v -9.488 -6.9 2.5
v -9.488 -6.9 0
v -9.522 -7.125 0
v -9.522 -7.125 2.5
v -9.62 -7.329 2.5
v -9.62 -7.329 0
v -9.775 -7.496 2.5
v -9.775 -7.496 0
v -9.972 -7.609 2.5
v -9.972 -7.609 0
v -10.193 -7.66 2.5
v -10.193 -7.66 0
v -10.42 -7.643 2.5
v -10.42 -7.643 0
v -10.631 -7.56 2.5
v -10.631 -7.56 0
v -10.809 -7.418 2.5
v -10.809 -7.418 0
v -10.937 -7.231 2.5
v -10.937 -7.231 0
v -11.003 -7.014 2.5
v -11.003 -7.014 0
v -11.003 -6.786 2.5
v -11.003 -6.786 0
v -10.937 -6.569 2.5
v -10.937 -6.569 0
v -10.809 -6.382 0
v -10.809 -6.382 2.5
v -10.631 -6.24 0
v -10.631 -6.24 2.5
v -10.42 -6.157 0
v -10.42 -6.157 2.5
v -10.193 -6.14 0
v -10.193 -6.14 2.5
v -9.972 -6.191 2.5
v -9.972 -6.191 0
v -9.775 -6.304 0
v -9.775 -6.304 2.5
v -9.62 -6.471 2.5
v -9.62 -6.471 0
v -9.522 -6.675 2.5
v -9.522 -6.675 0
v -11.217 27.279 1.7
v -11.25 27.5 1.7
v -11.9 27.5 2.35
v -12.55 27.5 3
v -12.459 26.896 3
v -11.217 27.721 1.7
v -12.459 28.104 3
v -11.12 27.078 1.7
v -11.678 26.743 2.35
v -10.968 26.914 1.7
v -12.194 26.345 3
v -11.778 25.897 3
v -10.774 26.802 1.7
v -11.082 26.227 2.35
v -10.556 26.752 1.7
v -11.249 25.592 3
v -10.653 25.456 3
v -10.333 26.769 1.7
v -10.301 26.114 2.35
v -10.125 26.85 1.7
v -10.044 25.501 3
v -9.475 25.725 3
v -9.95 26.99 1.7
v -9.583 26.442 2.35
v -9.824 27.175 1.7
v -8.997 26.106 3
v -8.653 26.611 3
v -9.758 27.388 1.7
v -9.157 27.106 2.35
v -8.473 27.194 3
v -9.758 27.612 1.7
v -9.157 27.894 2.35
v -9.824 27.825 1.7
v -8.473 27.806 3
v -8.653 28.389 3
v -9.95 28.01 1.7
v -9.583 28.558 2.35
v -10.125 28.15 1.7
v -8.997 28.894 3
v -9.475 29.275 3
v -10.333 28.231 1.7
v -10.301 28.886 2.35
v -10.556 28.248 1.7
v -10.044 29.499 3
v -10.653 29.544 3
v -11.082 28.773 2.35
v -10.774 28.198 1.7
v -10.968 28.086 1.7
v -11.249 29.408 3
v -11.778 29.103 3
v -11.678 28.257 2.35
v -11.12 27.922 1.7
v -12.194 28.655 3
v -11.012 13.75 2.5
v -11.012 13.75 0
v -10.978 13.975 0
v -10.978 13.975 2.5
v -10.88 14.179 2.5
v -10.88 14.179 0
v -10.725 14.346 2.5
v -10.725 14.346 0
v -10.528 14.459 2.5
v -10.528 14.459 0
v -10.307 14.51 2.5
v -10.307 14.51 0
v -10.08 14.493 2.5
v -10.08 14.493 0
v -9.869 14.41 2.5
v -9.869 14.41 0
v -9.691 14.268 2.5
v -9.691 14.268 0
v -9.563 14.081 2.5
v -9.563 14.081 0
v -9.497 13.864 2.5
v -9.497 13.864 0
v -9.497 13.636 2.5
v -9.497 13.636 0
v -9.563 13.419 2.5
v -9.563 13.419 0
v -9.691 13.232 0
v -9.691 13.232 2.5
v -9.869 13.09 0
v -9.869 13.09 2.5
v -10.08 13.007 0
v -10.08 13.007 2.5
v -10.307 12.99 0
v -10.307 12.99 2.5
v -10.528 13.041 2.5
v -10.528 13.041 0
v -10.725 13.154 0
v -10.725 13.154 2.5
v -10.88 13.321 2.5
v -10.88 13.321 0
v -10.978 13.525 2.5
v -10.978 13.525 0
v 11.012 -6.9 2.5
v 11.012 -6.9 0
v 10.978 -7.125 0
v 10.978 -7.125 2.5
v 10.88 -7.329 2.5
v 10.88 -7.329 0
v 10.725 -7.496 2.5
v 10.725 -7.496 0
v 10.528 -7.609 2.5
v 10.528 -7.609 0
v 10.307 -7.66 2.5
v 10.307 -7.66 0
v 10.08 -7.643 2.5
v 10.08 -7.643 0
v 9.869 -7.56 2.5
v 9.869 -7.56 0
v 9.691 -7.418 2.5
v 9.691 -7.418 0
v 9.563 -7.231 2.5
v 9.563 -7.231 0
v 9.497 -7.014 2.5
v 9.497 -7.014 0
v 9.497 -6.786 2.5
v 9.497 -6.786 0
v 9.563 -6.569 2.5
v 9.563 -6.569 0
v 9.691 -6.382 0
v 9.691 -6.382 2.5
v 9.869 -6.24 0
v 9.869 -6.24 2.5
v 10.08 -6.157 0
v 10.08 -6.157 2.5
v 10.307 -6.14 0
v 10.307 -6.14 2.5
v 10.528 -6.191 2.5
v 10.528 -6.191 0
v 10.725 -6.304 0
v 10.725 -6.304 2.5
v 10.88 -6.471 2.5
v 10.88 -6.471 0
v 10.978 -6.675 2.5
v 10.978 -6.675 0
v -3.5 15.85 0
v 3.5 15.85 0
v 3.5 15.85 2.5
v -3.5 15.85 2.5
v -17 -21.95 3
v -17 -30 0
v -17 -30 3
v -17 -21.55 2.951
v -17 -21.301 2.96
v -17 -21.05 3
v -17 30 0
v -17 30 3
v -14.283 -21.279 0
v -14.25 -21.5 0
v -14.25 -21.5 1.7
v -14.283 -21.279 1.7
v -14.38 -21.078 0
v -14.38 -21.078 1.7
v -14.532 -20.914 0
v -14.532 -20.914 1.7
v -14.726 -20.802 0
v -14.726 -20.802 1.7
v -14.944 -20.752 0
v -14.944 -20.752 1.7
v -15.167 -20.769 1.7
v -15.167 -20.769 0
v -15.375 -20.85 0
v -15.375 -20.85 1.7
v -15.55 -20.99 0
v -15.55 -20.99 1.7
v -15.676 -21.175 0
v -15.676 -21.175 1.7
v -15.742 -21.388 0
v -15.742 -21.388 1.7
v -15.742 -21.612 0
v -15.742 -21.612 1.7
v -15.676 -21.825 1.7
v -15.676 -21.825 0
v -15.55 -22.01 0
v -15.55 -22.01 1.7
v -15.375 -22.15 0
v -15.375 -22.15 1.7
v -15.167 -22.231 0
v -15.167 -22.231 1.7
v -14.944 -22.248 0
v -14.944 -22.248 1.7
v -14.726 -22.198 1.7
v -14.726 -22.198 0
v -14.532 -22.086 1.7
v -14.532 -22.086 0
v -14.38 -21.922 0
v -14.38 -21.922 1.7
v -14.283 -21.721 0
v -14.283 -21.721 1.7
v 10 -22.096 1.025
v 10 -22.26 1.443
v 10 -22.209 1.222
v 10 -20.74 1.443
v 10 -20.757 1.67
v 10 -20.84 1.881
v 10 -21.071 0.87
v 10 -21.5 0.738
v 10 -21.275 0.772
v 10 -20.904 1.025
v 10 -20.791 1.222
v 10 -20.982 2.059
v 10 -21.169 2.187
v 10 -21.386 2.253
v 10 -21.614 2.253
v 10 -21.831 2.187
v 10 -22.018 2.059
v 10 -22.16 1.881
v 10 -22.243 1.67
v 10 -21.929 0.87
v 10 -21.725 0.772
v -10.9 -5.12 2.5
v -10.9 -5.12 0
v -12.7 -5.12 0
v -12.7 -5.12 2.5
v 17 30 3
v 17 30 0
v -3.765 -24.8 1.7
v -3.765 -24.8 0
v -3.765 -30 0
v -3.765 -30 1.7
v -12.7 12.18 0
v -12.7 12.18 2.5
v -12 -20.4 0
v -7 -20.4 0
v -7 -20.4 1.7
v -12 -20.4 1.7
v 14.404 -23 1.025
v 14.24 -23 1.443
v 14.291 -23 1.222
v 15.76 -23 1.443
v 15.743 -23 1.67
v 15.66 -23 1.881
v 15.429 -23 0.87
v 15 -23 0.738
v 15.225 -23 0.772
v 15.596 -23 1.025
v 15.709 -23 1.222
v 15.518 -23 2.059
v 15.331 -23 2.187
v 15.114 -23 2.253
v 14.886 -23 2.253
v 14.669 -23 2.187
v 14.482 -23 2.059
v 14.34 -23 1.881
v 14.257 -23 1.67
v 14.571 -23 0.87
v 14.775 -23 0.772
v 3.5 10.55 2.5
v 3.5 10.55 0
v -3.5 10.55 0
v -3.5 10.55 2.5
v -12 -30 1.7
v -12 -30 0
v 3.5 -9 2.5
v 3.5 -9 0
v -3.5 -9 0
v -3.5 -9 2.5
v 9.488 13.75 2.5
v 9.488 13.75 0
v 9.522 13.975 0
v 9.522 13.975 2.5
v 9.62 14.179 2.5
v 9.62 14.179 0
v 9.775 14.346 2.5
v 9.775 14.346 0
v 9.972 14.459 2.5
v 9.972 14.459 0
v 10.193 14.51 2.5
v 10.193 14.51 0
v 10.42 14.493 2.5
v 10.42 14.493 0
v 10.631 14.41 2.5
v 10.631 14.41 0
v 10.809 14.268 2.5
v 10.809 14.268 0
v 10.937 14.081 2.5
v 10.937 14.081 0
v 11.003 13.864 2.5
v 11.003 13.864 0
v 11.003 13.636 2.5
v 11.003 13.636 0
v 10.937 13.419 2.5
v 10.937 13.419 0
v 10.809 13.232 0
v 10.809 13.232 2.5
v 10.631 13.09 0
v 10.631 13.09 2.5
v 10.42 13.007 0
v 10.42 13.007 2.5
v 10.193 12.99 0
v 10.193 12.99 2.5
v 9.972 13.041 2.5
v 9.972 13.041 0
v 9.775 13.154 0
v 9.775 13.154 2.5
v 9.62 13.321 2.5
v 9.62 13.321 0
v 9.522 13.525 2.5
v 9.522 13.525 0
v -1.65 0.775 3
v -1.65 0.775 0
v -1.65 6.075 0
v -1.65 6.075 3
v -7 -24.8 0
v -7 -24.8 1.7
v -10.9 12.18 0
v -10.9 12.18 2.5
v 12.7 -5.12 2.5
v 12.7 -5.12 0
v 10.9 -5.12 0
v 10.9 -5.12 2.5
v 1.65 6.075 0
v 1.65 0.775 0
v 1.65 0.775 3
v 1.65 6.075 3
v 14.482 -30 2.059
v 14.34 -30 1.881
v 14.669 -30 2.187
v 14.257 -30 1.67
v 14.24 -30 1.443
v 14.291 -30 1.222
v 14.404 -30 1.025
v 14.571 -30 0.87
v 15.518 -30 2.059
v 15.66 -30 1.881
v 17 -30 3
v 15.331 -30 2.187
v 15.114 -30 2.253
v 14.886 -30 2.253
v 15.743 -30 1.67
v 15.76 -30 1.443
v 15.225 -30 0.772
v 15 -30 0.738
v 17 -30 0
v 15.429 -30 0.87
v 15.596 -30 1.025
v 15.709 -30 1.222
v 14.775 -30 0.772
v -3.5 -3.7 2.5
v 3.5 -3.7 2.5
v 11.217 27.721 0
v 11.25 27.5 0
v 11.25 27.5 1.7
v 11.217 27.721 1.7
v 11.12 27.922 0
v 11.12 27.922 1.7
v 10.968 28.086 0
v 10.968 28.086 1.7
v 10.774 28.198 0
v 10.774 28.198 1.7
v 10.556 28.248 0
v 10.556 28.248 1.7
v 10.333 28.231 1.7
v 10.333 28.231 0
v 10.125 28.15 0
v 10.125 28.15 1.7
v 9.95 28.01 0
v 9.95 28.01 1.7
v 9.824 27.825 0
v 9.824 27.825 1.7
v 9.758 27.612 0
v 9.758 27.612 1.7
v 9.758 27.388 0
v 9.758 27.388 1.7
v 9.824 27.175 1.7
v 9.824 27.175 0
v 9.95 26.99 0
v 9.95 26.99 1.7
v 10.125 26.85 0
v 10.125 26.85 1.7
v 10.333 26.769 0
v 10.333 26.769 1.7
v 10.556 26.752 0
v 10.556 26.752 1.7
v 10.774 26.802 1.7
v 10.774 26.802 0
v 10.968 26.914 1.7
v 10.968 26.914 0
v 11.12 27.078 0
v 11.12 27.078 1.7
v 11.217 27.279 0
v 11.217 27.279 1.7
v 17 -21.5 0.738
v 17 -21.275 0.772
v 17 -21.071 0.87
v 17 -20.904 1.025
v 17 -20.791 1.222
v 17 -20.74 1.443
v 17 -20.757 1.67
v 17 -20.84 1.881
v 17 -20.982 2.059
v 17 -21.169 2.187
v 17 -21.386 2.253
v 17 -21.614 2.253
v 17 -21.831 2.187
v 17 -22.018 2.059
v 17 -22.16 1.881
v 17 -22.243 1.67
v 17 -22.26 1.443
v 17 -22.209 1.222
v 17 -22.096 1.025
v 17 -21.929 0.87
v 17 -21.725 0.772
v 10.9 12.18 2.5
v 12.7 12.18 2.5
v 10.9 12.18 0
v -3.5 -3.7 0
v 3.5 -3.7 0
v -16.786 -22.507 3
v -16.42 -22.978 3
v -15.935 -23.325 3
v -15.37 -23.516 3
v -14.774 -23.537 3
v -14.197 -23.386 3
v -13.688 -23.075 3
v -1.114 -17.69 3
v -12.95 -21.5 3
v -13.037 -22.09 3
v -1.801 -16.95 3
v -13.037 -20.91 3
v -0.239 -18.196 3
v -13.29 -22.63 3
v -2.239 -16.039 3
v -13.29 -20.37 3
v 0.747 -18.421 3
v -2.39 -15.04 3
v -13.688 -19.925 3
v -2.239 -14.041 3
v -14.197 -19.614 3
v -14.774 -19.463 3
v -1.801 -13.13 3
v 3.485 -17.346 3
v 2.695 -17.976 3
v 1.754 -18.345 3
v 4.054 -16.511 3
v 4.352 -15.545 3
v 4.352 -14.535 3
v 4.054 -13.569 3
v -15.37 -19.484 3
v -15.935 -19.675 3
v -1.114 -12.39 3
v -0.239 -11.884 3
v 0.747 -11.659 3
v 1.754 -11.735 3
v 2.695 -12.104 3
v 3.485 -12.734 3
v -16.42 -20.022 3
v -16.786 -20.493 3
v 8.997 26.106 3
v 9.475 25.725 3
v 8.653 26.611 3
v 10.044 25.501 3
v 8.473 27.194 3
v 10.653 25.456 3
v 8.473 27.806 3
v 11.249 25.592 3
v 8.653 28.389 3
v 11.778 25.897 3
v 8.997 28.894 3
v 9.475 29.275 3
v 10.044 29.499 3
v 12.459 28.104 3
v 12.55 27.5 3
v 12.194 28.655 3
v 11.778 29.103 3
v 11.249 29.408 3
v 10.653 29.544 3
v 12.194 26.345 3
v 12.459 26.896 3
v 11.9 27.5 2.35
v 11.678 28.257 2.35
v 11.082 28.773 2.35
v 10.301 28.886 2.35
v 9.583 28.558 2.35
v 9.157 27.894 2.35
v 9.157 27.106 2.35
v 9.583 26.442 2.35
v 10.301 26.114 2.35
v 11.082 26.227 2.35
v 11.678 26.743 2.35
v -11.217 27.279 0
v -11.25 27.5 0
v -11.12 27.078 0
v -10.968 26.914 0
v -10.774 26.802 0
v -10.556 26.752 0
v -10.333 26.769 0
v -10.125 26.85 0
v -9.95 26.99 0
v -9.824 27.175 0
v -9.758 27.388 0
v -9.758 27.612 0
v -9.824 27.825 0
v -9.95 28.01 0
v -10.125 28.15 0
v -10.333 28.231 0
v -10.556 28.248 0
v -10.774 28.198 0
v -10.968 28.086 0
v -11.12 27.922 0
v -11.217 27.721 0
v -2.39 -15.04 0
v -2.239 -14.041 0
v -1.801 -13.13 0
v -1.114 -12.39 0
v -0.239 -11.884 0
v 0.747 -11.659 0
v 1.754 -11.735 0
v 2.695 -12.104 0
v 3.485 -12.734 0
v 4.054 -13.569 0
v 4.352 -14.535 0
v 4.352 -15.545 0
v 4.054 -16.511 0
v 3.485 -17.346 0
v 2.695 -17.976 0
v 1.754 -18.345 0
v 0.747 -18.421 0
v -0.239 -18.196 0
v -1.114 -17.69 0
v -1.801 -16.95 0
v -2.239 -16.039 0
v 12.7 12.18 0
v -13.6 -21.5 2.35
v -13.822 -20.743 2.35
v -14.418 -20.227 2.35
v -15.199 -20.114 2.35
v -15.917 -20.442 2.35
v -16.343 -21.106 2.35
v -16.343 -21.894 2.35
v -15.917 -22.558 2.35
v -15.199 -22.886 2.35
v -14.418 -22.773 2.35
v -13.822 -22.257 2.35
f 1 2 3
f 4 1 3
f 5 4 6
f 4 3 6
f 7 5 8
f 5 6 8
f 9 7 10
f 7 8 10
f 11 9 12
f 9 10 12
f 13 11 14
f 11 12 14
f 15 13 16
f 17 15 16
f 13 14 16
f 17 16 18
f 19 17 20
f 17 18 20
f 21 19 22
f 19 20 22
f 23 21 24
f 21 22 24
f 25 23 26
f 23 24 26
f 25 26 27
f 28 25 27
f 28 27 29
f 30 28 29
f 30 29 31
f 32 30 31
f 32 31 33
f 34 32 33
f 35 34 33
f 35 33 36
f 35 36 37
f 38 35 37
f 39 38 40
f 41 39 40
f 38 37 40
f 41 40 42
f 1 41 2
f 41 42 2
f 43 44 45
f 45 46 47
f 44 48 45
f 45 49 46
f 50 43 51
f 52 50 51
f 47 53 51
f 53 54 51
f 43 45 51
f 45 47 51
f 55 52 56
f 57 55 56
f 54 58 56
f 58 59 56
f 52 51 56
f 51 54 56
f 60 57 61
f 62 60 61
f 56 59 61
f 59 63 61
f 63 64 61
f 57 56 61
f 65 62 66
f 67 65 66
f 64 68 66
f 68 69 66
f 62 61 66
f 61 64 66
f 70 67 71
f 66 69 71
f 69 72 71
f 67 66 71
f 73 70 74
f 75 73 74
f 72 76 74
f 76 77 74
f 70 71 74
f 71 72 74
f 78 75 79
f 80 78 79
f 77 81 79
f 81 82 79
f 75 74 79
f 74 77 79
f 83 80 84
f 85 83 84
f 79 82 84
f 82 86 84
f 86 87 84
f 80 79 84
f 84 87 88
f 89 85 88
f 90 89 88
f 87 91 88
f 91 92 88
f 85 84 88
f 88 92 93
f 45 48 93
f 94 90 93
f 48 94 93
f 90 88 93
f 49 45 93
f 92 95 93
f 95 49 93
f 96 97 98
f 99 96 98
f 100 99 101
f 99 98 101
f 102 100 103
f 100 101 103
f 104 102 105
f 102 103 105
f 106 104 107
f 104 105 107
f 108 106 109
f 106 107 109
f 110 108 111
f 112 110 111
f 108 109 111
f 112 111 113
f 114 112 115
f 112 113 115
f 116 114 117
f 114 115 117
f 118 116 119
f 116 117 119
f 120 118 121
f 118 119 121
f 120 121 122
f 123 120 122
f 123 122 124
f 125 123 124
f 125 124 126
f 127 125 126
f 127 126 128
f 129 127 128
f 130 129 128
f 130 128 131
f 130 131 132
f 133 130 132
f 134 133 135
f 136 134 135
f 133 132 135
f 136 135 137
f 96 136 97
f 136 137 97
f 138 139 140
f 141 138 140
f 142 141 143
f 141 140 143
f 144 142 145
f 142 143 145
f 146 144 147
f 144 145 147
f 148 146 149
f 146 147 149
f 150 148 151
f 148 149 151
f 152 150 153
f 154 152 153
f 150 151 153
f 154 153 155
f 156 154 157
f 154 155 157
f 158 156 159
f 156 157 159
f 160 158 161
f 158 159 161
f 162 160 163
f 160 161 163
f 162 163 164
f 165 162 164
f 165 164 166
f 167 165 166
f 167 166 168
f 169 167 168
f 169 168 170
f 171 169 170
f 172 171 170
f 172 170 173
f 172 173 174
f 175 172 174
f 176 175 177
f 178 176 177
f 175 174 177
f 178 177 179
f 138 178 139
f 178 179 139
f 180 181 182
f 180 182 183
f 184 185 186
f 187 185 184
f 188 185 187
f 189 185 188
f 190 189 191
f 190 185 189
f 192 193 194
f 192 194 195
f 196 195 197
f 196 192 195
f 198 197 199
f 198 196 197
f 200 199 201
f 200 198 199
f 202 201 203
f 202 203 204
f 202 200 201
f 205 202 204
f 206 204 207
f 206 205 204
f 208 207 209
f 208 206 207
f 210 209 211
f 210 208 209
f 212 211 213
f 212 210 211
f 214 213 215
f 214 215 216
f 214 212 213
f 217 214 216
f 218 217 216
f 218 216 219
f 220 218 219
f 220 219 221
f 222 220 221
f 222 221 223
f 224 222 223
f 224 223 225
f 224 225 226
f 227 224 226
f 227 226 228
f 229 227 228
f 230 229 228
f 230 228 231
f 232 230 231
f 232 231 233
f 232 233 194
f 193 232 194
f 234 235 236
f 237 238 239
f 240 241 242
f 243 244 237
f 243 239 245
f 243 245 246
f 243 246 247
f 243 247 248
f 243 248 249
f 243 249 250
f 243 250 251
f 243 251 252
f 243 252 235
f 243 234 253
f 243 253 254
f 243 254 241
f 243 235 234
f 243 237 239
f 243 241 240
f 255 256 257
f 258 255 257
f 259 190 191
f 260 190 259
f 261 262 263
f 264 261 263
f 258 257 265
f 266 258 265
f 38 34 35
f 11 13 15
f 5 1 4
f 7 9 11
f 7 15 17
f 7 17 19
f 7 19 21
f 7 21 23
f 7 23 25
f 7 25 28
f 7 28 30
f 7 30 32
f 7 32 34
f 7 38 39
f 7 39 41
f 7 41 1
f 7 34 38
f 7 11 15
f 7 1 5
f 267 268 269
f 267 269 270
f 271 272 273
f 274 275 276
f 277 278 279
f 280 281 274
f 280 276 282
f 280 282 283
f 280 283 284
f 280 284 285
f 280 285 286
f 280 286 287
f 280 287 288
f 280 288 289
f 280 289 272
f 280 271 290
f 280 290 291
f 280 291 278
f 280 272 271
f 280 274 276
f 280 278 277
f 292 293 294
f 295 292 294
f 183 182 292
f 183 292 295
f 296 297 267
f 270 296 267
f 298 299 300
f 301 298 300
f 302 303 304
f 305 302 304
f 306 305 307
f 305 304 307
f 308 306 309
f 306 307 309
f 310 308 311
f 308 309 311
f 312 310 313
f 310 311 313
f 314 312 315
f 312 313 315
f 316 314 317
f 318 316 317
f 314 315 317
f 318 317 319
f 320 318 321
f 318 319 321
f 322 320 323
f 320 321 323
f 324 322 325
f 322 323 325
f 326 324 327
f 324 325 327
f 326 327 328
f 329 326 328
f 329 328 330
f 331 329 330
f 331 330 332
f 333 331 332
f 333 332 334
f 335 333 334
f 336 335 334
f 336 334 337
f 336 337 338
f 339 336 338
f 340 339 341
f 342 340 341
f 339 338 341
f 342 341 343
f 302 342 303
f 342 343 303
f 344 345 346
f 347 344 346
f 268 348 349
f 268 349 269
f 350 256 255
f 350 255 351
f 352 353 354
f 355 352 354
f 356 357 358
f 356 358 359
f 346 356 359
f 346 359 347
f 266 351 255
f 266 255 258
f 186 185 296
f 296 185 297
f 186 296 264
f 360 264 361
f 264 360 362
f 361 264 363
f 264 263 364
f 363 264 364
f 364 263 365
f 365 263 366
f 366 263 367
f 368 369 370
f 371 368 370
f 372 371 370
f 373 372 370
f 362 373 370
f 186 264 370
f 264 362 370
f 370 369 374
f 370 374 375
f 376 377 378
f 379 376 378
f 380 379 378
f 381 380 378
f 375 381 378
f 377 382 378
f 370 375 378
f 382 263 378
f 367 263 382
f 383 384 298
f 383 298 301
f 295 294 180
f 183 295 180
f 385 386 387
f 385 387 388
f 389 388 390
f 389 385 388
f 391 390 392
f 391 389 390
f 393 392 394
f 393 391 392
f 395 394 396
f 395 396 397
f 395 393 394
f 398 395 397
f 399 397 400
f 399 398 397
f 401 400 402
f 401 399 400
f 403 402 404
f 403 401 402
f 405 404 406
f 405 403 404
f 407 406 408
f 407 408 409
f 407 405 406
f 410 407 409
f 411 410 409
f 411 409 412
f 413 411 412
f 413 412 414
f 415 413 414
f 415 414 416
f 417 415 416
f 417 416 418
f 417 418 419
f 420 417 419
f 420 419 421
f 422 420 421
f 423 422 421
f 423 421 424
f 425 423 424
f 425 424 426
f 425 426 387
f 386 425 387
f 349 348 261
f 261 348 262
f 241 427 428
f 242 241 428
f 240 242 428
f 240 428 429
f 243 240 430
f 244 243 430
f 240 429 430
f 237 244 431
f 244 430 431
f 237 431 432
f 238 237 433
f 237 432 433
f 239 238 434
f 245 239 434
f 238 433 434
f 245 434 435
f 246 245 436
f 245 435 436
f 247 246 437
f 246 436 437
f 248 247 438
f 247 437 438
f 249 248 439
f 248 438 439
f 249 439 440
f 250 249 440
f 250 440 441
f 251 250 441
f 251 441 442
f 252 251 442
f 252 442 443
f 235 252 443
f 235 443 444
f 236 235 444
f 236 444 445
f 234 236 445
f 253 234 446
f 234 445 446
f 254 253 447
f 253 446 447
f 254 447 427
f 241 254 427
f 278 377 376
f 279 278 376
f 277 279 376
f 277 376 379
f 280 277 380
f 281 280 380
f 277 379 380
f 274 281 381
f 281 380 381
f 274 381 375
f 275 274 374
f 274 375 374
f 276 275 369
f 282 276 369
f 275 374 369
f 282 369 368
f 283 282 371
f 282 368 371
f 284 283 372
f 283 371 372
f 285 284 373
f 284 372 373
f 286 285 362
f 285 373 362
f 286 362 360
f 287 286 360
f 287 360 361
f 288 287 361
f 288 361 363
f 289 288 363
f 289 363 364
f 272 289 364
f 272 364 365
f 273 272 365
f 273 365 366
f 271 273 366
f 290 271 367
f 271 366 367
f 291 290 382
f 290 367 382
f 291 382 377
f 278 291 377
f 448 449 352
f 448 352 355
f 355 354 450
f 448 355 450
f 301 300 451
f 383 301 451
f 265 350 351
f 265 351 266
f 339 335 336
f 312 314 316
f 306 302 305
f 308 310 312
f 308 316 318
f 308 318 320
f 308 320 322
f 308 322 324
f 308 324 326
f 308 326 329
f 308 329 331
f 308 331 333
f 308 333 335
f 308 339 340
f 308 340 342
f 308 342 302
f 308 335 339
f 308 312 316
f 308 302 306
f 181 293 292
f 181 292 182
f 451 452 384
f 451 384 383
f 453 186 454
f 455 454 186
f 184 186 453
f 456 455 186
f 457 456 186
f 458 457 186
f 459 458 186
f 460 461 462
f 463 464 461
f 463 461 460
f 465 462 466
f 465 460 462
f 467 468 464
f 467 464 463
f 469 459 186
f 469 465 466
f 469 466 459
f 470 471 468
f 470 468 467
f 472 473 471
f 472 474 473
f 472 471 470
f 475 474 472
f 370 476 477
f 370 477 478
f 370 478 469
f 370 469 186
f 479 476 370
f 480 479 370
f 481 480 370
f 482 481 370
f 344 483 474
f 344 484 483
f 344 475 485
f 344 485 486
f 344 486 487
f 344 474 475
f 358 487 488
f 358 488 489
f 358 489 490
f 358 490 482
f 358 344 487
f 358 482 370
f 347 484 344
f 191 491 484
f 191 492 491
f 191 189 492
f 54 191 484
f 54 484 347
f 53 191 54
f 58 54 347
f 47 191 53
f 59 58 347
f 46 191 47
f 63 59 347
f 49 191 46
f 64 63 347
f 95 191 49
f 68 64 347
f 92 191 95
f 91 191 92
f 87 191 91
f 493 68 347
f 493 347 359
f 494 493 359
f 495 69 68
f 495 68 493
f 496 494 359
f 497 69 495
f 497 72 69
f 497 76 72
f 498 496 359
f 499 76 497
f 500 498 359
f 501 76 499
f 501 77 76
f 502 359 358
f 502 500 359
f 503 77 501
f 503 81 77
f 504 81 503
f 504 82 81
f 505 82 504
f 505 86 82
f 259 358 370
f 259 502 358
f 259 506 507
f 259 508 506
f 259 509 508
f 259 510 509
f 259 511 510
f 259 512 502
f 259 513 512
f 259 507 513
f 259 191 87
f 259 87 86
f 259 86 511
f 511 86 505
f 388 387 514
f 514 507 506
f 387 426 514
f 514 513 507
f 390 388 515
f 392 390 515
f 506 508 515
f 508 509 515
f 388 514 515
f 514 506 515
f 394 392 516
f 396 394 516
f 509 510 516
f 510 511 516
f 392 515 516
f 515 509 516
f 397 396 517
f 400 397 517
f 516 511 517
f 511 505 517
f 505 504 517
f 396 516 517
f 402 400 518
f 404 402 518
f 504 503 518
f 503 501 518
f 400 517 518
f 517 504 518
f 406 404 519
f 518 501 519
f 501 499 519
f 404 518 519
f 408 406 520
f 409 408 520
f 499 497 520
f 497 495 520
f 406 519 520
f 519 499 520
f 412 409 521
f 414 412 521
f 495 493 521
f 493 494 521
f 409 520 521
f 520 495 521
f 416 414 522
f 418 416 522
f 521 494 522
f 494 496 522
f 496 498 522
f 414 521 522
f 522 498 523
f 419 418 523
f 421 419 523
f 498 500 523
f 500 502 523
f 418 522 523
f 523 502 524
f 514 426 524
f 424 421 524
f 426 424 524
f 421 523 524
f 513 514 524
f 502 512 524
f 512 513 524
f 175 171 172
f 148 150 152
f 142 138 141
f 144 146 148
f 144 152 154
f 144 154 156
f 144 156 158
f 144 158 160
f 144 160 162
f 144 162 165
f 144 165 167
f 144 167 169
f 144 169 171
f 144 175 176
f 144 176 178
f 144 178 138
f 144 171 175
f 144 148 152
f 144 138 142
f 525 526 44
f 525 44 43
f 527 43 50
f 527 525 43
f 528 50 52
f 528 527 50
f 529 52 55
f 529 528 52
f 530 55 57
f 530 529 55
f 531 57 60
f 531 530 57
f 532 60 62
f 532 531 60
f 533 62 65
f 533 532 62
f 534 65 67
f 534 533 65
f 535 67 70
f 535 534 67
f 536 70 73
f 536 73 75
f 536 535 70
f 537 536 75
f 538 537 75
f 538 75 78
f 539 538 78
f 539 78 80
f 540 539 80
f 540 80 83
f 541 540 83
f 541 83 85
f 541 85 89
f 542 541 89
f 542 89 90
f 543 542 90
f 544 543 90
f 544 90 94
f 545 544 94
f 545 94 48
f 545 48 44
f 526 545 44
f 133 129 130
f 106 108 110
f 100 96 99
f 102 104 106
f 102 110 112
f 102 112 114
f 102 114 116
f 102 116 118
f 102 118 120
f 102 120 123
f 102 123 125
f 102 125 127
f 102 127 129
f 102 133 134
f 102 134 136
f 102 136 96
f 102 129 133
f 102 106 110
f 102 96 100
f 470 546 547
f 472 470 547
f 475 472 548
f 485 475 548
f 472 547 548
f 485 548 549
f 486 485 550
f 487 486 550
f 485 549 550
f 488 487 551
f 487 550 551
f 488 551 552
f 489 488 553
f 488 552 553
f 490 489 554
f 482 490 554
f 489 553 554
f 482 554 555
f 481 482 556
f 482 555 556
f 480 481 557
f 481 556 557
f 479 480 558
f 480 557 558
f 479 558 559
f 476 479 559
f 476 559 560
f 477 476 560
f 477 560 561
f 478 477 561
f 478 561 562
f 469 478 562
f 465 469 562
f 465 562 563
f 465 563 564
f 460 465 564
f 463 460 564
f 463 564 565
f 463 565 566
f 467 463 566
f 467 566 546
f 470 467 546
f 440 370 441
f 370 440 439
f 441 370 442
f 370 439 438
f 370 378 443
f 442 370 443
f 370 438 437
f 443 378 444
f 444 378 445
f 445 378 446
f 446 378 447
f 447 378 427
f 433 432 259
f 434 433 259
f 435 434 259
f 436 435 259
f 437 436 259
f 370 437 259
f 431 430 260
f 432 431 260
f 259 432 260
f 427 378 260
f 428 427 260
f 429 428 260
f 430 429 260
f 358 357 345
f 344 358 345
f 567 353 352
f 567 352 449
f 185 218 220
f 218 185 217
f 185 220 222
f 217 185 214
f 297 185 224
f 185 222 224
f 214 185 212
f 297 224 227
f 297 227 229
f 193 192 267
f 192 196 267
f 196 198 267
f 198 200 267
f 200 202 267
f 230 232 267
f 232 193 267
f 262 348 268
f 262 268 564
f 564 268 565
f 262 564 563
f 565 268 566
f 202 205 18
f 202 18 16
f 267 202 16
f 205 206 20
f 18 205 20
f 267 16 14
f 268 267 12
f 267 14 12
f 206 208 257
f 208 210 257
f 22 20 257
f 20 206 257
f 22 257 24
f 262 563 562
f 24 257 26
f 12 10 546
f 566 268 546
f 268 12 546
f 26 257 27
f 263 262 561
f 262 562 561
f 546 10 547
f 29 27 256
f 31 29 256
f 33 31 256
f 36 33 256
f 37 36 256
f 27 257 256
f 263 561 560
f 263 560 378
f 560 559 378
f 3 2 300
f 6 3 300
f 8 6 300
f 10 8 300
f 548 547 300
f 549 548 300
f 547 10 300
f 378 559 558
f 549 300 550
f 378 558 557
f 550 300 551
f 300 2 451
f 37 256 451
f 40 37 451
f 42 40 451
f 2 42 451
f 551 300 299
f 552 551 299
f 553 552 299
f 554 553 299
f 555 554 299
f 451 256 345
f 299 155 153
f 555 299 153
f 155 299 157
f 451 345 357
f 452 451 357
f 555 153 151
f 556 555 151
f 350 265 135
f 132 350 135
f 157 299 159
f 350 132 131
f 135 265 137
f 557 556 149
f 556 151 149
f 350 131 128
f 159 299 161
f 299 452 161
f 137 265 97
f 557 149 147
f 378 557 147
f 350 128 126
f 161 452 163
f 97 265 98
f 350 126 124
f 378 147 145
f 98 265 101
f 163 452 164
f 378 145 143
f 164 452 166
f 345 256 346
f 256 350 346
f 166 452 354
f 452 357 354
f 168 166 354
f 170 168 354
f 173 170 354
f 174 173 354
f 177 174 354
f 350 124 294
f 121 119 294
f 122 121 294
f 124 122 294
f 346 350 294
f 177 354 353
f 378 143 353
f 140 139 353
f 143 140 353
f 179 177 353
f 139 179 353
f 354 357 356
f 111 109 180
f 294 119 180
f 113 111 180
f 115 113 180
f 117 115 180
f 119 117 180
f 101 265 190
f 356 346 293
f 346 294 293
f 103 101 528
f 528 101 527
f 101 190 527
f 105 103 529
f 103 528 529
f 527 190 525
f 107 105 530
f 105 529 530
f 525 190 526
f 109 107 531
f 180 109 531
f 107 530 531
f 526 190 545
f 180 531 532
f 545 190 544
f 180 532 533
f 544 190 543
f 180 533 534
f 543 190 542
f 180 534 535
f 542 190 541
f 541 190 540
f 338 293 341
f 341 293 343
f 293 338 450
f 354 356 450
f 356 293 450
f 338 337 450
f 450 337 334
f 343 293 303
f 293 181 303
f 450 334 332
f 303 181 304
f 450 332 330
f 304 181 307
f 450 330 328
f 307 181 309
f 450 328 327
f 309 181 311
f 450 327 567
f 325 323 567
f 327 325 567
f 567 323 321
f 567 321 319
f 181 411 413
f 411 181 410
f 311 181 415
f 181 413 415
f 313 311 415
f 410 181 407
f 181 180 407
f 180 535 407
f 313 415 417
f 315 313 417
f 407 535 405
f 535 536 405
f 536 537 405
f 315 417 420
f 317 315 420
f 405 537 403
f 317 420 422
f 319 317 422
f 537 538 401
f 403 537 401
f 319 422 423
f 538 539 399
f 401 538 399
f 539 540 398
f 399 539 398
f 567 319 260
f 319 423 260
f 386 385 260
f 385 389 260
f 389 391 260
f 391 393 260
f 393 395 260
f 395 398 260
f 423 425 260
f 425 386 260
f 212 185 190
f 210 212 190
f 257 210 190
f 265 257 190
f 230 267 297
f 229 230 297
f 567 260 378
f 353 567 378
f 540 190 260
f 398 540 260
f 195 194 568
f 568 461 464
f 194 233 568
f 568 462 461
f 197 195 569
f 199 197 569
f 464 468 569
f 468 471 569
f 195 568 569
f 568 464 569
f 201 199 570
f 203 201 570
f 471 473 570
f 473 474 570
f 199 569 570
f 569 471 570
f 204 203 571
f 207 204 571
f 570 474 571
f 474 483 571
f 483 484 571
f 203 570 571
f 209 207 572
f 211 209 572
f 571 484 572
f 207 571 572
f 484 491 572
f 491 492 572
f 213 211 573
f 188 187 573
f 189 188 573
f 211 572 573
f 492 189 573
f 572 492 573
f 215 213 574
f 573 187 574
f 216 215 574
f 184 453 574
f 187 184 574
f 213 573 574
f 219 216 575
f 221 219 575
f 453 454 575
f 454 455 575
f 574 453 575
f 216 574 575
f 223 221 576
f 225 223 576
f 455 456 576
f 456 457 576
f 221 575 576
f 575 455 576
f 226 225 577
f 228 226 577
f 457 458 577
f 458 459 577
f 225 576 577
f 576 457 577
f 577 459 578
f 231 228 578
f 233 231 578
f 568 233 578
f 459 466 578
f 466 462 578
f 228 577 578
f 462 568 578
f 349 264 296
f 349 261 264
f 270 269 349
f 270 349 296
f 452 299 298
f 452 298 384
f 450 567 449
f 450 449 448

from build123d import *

# Parameters (mm, degrees)
SKETCH1_W           = 34
SKETCH1_H           = 60
SKETCH1_R           = 0.75
BOSS_EXTRUDE1_DEPTH = 3
CHAMFER1_SIZE       = 1.3
SKETCH2_R           = 0.762
CUT_EXTRUDE1_DEPTH  = 7
SKETCH3_W           = 5
SKETCH3_H           = 4.4
CUT_EXTRUDE2_DEPTH  = 1.7
SKETCH4_R           = 0.762
CUT_EXTRUDE3_DEPTH  = 7
SKETCH5_W           = 3.3
SKETCH5_H           = 5.3
CUT_EXTRUDE4_DEPTH  = 3.5
SKETCH7_R           = 0.762
SKETCH7_W           = 7
SKETCH7_H           = 5.3
CUT_EXTRUDE5_DEPTH  = 2.5
SKETCH8_W           = 1.8
SKETCH8_H           = 17.3
CUT_EXTRUDE6_DEPTH  = 2.5
SKETCH9_R           = 3.39
CUT_EXTRUDE7_DEPTH  = 7.5


with BuildPart() as part:
    # Sketch1 → Boss-Extrude1 (new body)
    with BuildSketch(Plane.XY):
        Rectangle(SKETCH1_W, SKETCH1_H)
        with Locations((-15, -21.5)):
            Circle(SKETCH1_R, mode=Mode.SUBTRACT)
        with Locations(Location((-10.5, 27.5, 0), (0, 0, 180))):
            Circle(SKETCH1_R, mode=Mode.SUBTRACT)
        with Locations((10.5, 27.5)):
            Circle(SKETCH1_R, mode=Mode.SUBTRACT)
    extrude(amount=BOSS_EXTRUDE1_DEPTH)

    # Chamfer1
    # the kernel refuses this chamfer: 1.3 mm, written as the material it takes off along each edge
    with BuildSketch(Plane(origin=(-15, -21.5, 3), x_dir=(1, 0, 0), z_dir=(0, -1, 0))) as chamfer1_piece_1:
        Polygon((0.75, -CHAMFER1_SIZE), (0.75 + CHAMFER1_SIZE, 0), (0.75, 0), align=None)
    revolve(axis=Axis((-15, -21.5, 3), (0, 0, 1)), mode=Mode.SUBTRACT)
    with BuildSketch(Plane(origin=(-10.5, 27.5, 3), x_dir=(-1, 0, 0), z_dir=(0, 1, 0))) as chamfer1_piece_2:
        Polygon((0.75, -CHAMFER1_SIZE), (0.75 + CHAMFER1_SIZE, 0), (0.75, 0), align=None)
    revolve(axis=Axis((-10.5, 27.5, 3), (0, 0, 1)), mode=Mode.SUBTRACT)
    with BuildSketch(Plane(origin=(10.5, 27.5, 3), x_dir=(1, 0, 0), z_dir=(0, -1, 0))) as chamfer1_piece_3:
        Polygon((0.75, -CHAMFER1_SIZE), (0.75 + CHAMFER1_SIZE, 0), (0.75, 0), align=None)
    revolve(axis=Axis((10.5, 27.5, 3), (0, 0, 1)), mode=Mode.SUBTRACT)

    # Sketch2 → Cut-Extrude1 (cut)
    with BuildSketch(Plane(origin=(17, 0, 0), x_dir=(0, 0, -1), z_dir=(1, 0, 0))):
        with Locations((-1.5, -21.5)):
            Circle(SKETCH2_R)
    extrude(amount=-CUT_EXTRUDE1_DEPTH, mode=Mode.SUBTRACT)

    # Sketch3 → Cut-Extrude2 (cut)
    with BuildSketch(Plane(origin=(0, 0, 0), x_dir=(-1, 0, 0), z_dir=(0, 0, -1))):
        Polygon((3.765333438, -30), (12, -30), (12, -24.8), (7, -24.8), (3.765333438, -24.8), align=None)
        with Locations((9.5, -22.6)):
            Rectangle(SKETCH3_W, SKETCH3_H)
    extrude(amount=-CUT_EXTRUDE2_DEPTH, mode=Mode.SUBTRACT)

    # Sketch4 → Cut-Extrude3 (cut)
    with BuildSketch(Plane.XZ.offset(30)):
        with Locations(Location((15, 1.5, 0), (0, 0, 270))):
            Circle(SKETCH4_R)
    extrude(amount=-CUT_EXTRUDE3_DEPTH, mode=Mode.SUBTRACT)

    # Sketch5 → Cut-Extrude4 (cut)
    with BuildSketch(Plane(origin=(0, 0, 0), x_dir=(-1, 0, 0), z_dir=(0, 0, -1))):
        with Locations((0, 3.425)):
            Rectangle(SKETCH5_W, SKETCH5_H)
    extrude(amount=-CUT_EXTRUDE4_DEPTH, mode=Mode.SUBTRACT)

    # Sketch7 → Cut-Extrude5 (cut)
    with BuildSketch(Plane(origin=(0, 0, 0), x_dir=(-1, 0, 0), z_dir=(0, 0, -1))):
        with Locations((-10.25, 13.75)):
            Circle(SKETCH7_R)
        with Locations((10.25, 13.75)):
            Circle(SKETCH7_R)
        with Locations(Location((10.25, -6.9, 0), (0, 0, 180))):
            Circle(SKETCH7_R)
        with Locations(Location((-10.25, -6.9, 0), (0, 0, 180))):
            Circle(SKETCH7_R)
        with Locations((0, 13.2)):
            Rectangle(SKETCH7_W, SKETCH7_H)
        with Locations((0, -6.35)):
            Rectangle(SKETCH7_W, SKETCH7_H)
    extrude(amount=-CUT_EXTRUDE5_DEPTH, mode=Mode.SUBTRACT)

    # Sketch8 → Cut-Extrude6 (cut)
    with BuildSketch(Plane(origin=(0, 0, 0), x_dir=(-1, 0, 0), z_dir=(0, 0, -1))):
        with Locations((11.8, 3.53)):
            Rectangle(SKETCH8_W, SKETCH8_H)
        with Locations((-11.8, 3.53)):
            Rectangle(SKETCH8_W, SKETCH8_H)
    extrude(amount=-CUT_EXTRUDE6_DEPTH, mode=Mode.SUBTRACT)

    # Sketch9 → Cut-Extrude7 (cut)
    with BuildSketch(Plane(origin=(0, 0, 0), x_dir=(-1, 0, 0), z_dir=(0, 0, -1))):
        with Locations((-1, -15.04)):
            Circle(SKETCH9_R)
    extrude(amount=-CUT_EXTRUDE7_DEPTH, mode=Mode.SUBTRACT)


solid = part.part
